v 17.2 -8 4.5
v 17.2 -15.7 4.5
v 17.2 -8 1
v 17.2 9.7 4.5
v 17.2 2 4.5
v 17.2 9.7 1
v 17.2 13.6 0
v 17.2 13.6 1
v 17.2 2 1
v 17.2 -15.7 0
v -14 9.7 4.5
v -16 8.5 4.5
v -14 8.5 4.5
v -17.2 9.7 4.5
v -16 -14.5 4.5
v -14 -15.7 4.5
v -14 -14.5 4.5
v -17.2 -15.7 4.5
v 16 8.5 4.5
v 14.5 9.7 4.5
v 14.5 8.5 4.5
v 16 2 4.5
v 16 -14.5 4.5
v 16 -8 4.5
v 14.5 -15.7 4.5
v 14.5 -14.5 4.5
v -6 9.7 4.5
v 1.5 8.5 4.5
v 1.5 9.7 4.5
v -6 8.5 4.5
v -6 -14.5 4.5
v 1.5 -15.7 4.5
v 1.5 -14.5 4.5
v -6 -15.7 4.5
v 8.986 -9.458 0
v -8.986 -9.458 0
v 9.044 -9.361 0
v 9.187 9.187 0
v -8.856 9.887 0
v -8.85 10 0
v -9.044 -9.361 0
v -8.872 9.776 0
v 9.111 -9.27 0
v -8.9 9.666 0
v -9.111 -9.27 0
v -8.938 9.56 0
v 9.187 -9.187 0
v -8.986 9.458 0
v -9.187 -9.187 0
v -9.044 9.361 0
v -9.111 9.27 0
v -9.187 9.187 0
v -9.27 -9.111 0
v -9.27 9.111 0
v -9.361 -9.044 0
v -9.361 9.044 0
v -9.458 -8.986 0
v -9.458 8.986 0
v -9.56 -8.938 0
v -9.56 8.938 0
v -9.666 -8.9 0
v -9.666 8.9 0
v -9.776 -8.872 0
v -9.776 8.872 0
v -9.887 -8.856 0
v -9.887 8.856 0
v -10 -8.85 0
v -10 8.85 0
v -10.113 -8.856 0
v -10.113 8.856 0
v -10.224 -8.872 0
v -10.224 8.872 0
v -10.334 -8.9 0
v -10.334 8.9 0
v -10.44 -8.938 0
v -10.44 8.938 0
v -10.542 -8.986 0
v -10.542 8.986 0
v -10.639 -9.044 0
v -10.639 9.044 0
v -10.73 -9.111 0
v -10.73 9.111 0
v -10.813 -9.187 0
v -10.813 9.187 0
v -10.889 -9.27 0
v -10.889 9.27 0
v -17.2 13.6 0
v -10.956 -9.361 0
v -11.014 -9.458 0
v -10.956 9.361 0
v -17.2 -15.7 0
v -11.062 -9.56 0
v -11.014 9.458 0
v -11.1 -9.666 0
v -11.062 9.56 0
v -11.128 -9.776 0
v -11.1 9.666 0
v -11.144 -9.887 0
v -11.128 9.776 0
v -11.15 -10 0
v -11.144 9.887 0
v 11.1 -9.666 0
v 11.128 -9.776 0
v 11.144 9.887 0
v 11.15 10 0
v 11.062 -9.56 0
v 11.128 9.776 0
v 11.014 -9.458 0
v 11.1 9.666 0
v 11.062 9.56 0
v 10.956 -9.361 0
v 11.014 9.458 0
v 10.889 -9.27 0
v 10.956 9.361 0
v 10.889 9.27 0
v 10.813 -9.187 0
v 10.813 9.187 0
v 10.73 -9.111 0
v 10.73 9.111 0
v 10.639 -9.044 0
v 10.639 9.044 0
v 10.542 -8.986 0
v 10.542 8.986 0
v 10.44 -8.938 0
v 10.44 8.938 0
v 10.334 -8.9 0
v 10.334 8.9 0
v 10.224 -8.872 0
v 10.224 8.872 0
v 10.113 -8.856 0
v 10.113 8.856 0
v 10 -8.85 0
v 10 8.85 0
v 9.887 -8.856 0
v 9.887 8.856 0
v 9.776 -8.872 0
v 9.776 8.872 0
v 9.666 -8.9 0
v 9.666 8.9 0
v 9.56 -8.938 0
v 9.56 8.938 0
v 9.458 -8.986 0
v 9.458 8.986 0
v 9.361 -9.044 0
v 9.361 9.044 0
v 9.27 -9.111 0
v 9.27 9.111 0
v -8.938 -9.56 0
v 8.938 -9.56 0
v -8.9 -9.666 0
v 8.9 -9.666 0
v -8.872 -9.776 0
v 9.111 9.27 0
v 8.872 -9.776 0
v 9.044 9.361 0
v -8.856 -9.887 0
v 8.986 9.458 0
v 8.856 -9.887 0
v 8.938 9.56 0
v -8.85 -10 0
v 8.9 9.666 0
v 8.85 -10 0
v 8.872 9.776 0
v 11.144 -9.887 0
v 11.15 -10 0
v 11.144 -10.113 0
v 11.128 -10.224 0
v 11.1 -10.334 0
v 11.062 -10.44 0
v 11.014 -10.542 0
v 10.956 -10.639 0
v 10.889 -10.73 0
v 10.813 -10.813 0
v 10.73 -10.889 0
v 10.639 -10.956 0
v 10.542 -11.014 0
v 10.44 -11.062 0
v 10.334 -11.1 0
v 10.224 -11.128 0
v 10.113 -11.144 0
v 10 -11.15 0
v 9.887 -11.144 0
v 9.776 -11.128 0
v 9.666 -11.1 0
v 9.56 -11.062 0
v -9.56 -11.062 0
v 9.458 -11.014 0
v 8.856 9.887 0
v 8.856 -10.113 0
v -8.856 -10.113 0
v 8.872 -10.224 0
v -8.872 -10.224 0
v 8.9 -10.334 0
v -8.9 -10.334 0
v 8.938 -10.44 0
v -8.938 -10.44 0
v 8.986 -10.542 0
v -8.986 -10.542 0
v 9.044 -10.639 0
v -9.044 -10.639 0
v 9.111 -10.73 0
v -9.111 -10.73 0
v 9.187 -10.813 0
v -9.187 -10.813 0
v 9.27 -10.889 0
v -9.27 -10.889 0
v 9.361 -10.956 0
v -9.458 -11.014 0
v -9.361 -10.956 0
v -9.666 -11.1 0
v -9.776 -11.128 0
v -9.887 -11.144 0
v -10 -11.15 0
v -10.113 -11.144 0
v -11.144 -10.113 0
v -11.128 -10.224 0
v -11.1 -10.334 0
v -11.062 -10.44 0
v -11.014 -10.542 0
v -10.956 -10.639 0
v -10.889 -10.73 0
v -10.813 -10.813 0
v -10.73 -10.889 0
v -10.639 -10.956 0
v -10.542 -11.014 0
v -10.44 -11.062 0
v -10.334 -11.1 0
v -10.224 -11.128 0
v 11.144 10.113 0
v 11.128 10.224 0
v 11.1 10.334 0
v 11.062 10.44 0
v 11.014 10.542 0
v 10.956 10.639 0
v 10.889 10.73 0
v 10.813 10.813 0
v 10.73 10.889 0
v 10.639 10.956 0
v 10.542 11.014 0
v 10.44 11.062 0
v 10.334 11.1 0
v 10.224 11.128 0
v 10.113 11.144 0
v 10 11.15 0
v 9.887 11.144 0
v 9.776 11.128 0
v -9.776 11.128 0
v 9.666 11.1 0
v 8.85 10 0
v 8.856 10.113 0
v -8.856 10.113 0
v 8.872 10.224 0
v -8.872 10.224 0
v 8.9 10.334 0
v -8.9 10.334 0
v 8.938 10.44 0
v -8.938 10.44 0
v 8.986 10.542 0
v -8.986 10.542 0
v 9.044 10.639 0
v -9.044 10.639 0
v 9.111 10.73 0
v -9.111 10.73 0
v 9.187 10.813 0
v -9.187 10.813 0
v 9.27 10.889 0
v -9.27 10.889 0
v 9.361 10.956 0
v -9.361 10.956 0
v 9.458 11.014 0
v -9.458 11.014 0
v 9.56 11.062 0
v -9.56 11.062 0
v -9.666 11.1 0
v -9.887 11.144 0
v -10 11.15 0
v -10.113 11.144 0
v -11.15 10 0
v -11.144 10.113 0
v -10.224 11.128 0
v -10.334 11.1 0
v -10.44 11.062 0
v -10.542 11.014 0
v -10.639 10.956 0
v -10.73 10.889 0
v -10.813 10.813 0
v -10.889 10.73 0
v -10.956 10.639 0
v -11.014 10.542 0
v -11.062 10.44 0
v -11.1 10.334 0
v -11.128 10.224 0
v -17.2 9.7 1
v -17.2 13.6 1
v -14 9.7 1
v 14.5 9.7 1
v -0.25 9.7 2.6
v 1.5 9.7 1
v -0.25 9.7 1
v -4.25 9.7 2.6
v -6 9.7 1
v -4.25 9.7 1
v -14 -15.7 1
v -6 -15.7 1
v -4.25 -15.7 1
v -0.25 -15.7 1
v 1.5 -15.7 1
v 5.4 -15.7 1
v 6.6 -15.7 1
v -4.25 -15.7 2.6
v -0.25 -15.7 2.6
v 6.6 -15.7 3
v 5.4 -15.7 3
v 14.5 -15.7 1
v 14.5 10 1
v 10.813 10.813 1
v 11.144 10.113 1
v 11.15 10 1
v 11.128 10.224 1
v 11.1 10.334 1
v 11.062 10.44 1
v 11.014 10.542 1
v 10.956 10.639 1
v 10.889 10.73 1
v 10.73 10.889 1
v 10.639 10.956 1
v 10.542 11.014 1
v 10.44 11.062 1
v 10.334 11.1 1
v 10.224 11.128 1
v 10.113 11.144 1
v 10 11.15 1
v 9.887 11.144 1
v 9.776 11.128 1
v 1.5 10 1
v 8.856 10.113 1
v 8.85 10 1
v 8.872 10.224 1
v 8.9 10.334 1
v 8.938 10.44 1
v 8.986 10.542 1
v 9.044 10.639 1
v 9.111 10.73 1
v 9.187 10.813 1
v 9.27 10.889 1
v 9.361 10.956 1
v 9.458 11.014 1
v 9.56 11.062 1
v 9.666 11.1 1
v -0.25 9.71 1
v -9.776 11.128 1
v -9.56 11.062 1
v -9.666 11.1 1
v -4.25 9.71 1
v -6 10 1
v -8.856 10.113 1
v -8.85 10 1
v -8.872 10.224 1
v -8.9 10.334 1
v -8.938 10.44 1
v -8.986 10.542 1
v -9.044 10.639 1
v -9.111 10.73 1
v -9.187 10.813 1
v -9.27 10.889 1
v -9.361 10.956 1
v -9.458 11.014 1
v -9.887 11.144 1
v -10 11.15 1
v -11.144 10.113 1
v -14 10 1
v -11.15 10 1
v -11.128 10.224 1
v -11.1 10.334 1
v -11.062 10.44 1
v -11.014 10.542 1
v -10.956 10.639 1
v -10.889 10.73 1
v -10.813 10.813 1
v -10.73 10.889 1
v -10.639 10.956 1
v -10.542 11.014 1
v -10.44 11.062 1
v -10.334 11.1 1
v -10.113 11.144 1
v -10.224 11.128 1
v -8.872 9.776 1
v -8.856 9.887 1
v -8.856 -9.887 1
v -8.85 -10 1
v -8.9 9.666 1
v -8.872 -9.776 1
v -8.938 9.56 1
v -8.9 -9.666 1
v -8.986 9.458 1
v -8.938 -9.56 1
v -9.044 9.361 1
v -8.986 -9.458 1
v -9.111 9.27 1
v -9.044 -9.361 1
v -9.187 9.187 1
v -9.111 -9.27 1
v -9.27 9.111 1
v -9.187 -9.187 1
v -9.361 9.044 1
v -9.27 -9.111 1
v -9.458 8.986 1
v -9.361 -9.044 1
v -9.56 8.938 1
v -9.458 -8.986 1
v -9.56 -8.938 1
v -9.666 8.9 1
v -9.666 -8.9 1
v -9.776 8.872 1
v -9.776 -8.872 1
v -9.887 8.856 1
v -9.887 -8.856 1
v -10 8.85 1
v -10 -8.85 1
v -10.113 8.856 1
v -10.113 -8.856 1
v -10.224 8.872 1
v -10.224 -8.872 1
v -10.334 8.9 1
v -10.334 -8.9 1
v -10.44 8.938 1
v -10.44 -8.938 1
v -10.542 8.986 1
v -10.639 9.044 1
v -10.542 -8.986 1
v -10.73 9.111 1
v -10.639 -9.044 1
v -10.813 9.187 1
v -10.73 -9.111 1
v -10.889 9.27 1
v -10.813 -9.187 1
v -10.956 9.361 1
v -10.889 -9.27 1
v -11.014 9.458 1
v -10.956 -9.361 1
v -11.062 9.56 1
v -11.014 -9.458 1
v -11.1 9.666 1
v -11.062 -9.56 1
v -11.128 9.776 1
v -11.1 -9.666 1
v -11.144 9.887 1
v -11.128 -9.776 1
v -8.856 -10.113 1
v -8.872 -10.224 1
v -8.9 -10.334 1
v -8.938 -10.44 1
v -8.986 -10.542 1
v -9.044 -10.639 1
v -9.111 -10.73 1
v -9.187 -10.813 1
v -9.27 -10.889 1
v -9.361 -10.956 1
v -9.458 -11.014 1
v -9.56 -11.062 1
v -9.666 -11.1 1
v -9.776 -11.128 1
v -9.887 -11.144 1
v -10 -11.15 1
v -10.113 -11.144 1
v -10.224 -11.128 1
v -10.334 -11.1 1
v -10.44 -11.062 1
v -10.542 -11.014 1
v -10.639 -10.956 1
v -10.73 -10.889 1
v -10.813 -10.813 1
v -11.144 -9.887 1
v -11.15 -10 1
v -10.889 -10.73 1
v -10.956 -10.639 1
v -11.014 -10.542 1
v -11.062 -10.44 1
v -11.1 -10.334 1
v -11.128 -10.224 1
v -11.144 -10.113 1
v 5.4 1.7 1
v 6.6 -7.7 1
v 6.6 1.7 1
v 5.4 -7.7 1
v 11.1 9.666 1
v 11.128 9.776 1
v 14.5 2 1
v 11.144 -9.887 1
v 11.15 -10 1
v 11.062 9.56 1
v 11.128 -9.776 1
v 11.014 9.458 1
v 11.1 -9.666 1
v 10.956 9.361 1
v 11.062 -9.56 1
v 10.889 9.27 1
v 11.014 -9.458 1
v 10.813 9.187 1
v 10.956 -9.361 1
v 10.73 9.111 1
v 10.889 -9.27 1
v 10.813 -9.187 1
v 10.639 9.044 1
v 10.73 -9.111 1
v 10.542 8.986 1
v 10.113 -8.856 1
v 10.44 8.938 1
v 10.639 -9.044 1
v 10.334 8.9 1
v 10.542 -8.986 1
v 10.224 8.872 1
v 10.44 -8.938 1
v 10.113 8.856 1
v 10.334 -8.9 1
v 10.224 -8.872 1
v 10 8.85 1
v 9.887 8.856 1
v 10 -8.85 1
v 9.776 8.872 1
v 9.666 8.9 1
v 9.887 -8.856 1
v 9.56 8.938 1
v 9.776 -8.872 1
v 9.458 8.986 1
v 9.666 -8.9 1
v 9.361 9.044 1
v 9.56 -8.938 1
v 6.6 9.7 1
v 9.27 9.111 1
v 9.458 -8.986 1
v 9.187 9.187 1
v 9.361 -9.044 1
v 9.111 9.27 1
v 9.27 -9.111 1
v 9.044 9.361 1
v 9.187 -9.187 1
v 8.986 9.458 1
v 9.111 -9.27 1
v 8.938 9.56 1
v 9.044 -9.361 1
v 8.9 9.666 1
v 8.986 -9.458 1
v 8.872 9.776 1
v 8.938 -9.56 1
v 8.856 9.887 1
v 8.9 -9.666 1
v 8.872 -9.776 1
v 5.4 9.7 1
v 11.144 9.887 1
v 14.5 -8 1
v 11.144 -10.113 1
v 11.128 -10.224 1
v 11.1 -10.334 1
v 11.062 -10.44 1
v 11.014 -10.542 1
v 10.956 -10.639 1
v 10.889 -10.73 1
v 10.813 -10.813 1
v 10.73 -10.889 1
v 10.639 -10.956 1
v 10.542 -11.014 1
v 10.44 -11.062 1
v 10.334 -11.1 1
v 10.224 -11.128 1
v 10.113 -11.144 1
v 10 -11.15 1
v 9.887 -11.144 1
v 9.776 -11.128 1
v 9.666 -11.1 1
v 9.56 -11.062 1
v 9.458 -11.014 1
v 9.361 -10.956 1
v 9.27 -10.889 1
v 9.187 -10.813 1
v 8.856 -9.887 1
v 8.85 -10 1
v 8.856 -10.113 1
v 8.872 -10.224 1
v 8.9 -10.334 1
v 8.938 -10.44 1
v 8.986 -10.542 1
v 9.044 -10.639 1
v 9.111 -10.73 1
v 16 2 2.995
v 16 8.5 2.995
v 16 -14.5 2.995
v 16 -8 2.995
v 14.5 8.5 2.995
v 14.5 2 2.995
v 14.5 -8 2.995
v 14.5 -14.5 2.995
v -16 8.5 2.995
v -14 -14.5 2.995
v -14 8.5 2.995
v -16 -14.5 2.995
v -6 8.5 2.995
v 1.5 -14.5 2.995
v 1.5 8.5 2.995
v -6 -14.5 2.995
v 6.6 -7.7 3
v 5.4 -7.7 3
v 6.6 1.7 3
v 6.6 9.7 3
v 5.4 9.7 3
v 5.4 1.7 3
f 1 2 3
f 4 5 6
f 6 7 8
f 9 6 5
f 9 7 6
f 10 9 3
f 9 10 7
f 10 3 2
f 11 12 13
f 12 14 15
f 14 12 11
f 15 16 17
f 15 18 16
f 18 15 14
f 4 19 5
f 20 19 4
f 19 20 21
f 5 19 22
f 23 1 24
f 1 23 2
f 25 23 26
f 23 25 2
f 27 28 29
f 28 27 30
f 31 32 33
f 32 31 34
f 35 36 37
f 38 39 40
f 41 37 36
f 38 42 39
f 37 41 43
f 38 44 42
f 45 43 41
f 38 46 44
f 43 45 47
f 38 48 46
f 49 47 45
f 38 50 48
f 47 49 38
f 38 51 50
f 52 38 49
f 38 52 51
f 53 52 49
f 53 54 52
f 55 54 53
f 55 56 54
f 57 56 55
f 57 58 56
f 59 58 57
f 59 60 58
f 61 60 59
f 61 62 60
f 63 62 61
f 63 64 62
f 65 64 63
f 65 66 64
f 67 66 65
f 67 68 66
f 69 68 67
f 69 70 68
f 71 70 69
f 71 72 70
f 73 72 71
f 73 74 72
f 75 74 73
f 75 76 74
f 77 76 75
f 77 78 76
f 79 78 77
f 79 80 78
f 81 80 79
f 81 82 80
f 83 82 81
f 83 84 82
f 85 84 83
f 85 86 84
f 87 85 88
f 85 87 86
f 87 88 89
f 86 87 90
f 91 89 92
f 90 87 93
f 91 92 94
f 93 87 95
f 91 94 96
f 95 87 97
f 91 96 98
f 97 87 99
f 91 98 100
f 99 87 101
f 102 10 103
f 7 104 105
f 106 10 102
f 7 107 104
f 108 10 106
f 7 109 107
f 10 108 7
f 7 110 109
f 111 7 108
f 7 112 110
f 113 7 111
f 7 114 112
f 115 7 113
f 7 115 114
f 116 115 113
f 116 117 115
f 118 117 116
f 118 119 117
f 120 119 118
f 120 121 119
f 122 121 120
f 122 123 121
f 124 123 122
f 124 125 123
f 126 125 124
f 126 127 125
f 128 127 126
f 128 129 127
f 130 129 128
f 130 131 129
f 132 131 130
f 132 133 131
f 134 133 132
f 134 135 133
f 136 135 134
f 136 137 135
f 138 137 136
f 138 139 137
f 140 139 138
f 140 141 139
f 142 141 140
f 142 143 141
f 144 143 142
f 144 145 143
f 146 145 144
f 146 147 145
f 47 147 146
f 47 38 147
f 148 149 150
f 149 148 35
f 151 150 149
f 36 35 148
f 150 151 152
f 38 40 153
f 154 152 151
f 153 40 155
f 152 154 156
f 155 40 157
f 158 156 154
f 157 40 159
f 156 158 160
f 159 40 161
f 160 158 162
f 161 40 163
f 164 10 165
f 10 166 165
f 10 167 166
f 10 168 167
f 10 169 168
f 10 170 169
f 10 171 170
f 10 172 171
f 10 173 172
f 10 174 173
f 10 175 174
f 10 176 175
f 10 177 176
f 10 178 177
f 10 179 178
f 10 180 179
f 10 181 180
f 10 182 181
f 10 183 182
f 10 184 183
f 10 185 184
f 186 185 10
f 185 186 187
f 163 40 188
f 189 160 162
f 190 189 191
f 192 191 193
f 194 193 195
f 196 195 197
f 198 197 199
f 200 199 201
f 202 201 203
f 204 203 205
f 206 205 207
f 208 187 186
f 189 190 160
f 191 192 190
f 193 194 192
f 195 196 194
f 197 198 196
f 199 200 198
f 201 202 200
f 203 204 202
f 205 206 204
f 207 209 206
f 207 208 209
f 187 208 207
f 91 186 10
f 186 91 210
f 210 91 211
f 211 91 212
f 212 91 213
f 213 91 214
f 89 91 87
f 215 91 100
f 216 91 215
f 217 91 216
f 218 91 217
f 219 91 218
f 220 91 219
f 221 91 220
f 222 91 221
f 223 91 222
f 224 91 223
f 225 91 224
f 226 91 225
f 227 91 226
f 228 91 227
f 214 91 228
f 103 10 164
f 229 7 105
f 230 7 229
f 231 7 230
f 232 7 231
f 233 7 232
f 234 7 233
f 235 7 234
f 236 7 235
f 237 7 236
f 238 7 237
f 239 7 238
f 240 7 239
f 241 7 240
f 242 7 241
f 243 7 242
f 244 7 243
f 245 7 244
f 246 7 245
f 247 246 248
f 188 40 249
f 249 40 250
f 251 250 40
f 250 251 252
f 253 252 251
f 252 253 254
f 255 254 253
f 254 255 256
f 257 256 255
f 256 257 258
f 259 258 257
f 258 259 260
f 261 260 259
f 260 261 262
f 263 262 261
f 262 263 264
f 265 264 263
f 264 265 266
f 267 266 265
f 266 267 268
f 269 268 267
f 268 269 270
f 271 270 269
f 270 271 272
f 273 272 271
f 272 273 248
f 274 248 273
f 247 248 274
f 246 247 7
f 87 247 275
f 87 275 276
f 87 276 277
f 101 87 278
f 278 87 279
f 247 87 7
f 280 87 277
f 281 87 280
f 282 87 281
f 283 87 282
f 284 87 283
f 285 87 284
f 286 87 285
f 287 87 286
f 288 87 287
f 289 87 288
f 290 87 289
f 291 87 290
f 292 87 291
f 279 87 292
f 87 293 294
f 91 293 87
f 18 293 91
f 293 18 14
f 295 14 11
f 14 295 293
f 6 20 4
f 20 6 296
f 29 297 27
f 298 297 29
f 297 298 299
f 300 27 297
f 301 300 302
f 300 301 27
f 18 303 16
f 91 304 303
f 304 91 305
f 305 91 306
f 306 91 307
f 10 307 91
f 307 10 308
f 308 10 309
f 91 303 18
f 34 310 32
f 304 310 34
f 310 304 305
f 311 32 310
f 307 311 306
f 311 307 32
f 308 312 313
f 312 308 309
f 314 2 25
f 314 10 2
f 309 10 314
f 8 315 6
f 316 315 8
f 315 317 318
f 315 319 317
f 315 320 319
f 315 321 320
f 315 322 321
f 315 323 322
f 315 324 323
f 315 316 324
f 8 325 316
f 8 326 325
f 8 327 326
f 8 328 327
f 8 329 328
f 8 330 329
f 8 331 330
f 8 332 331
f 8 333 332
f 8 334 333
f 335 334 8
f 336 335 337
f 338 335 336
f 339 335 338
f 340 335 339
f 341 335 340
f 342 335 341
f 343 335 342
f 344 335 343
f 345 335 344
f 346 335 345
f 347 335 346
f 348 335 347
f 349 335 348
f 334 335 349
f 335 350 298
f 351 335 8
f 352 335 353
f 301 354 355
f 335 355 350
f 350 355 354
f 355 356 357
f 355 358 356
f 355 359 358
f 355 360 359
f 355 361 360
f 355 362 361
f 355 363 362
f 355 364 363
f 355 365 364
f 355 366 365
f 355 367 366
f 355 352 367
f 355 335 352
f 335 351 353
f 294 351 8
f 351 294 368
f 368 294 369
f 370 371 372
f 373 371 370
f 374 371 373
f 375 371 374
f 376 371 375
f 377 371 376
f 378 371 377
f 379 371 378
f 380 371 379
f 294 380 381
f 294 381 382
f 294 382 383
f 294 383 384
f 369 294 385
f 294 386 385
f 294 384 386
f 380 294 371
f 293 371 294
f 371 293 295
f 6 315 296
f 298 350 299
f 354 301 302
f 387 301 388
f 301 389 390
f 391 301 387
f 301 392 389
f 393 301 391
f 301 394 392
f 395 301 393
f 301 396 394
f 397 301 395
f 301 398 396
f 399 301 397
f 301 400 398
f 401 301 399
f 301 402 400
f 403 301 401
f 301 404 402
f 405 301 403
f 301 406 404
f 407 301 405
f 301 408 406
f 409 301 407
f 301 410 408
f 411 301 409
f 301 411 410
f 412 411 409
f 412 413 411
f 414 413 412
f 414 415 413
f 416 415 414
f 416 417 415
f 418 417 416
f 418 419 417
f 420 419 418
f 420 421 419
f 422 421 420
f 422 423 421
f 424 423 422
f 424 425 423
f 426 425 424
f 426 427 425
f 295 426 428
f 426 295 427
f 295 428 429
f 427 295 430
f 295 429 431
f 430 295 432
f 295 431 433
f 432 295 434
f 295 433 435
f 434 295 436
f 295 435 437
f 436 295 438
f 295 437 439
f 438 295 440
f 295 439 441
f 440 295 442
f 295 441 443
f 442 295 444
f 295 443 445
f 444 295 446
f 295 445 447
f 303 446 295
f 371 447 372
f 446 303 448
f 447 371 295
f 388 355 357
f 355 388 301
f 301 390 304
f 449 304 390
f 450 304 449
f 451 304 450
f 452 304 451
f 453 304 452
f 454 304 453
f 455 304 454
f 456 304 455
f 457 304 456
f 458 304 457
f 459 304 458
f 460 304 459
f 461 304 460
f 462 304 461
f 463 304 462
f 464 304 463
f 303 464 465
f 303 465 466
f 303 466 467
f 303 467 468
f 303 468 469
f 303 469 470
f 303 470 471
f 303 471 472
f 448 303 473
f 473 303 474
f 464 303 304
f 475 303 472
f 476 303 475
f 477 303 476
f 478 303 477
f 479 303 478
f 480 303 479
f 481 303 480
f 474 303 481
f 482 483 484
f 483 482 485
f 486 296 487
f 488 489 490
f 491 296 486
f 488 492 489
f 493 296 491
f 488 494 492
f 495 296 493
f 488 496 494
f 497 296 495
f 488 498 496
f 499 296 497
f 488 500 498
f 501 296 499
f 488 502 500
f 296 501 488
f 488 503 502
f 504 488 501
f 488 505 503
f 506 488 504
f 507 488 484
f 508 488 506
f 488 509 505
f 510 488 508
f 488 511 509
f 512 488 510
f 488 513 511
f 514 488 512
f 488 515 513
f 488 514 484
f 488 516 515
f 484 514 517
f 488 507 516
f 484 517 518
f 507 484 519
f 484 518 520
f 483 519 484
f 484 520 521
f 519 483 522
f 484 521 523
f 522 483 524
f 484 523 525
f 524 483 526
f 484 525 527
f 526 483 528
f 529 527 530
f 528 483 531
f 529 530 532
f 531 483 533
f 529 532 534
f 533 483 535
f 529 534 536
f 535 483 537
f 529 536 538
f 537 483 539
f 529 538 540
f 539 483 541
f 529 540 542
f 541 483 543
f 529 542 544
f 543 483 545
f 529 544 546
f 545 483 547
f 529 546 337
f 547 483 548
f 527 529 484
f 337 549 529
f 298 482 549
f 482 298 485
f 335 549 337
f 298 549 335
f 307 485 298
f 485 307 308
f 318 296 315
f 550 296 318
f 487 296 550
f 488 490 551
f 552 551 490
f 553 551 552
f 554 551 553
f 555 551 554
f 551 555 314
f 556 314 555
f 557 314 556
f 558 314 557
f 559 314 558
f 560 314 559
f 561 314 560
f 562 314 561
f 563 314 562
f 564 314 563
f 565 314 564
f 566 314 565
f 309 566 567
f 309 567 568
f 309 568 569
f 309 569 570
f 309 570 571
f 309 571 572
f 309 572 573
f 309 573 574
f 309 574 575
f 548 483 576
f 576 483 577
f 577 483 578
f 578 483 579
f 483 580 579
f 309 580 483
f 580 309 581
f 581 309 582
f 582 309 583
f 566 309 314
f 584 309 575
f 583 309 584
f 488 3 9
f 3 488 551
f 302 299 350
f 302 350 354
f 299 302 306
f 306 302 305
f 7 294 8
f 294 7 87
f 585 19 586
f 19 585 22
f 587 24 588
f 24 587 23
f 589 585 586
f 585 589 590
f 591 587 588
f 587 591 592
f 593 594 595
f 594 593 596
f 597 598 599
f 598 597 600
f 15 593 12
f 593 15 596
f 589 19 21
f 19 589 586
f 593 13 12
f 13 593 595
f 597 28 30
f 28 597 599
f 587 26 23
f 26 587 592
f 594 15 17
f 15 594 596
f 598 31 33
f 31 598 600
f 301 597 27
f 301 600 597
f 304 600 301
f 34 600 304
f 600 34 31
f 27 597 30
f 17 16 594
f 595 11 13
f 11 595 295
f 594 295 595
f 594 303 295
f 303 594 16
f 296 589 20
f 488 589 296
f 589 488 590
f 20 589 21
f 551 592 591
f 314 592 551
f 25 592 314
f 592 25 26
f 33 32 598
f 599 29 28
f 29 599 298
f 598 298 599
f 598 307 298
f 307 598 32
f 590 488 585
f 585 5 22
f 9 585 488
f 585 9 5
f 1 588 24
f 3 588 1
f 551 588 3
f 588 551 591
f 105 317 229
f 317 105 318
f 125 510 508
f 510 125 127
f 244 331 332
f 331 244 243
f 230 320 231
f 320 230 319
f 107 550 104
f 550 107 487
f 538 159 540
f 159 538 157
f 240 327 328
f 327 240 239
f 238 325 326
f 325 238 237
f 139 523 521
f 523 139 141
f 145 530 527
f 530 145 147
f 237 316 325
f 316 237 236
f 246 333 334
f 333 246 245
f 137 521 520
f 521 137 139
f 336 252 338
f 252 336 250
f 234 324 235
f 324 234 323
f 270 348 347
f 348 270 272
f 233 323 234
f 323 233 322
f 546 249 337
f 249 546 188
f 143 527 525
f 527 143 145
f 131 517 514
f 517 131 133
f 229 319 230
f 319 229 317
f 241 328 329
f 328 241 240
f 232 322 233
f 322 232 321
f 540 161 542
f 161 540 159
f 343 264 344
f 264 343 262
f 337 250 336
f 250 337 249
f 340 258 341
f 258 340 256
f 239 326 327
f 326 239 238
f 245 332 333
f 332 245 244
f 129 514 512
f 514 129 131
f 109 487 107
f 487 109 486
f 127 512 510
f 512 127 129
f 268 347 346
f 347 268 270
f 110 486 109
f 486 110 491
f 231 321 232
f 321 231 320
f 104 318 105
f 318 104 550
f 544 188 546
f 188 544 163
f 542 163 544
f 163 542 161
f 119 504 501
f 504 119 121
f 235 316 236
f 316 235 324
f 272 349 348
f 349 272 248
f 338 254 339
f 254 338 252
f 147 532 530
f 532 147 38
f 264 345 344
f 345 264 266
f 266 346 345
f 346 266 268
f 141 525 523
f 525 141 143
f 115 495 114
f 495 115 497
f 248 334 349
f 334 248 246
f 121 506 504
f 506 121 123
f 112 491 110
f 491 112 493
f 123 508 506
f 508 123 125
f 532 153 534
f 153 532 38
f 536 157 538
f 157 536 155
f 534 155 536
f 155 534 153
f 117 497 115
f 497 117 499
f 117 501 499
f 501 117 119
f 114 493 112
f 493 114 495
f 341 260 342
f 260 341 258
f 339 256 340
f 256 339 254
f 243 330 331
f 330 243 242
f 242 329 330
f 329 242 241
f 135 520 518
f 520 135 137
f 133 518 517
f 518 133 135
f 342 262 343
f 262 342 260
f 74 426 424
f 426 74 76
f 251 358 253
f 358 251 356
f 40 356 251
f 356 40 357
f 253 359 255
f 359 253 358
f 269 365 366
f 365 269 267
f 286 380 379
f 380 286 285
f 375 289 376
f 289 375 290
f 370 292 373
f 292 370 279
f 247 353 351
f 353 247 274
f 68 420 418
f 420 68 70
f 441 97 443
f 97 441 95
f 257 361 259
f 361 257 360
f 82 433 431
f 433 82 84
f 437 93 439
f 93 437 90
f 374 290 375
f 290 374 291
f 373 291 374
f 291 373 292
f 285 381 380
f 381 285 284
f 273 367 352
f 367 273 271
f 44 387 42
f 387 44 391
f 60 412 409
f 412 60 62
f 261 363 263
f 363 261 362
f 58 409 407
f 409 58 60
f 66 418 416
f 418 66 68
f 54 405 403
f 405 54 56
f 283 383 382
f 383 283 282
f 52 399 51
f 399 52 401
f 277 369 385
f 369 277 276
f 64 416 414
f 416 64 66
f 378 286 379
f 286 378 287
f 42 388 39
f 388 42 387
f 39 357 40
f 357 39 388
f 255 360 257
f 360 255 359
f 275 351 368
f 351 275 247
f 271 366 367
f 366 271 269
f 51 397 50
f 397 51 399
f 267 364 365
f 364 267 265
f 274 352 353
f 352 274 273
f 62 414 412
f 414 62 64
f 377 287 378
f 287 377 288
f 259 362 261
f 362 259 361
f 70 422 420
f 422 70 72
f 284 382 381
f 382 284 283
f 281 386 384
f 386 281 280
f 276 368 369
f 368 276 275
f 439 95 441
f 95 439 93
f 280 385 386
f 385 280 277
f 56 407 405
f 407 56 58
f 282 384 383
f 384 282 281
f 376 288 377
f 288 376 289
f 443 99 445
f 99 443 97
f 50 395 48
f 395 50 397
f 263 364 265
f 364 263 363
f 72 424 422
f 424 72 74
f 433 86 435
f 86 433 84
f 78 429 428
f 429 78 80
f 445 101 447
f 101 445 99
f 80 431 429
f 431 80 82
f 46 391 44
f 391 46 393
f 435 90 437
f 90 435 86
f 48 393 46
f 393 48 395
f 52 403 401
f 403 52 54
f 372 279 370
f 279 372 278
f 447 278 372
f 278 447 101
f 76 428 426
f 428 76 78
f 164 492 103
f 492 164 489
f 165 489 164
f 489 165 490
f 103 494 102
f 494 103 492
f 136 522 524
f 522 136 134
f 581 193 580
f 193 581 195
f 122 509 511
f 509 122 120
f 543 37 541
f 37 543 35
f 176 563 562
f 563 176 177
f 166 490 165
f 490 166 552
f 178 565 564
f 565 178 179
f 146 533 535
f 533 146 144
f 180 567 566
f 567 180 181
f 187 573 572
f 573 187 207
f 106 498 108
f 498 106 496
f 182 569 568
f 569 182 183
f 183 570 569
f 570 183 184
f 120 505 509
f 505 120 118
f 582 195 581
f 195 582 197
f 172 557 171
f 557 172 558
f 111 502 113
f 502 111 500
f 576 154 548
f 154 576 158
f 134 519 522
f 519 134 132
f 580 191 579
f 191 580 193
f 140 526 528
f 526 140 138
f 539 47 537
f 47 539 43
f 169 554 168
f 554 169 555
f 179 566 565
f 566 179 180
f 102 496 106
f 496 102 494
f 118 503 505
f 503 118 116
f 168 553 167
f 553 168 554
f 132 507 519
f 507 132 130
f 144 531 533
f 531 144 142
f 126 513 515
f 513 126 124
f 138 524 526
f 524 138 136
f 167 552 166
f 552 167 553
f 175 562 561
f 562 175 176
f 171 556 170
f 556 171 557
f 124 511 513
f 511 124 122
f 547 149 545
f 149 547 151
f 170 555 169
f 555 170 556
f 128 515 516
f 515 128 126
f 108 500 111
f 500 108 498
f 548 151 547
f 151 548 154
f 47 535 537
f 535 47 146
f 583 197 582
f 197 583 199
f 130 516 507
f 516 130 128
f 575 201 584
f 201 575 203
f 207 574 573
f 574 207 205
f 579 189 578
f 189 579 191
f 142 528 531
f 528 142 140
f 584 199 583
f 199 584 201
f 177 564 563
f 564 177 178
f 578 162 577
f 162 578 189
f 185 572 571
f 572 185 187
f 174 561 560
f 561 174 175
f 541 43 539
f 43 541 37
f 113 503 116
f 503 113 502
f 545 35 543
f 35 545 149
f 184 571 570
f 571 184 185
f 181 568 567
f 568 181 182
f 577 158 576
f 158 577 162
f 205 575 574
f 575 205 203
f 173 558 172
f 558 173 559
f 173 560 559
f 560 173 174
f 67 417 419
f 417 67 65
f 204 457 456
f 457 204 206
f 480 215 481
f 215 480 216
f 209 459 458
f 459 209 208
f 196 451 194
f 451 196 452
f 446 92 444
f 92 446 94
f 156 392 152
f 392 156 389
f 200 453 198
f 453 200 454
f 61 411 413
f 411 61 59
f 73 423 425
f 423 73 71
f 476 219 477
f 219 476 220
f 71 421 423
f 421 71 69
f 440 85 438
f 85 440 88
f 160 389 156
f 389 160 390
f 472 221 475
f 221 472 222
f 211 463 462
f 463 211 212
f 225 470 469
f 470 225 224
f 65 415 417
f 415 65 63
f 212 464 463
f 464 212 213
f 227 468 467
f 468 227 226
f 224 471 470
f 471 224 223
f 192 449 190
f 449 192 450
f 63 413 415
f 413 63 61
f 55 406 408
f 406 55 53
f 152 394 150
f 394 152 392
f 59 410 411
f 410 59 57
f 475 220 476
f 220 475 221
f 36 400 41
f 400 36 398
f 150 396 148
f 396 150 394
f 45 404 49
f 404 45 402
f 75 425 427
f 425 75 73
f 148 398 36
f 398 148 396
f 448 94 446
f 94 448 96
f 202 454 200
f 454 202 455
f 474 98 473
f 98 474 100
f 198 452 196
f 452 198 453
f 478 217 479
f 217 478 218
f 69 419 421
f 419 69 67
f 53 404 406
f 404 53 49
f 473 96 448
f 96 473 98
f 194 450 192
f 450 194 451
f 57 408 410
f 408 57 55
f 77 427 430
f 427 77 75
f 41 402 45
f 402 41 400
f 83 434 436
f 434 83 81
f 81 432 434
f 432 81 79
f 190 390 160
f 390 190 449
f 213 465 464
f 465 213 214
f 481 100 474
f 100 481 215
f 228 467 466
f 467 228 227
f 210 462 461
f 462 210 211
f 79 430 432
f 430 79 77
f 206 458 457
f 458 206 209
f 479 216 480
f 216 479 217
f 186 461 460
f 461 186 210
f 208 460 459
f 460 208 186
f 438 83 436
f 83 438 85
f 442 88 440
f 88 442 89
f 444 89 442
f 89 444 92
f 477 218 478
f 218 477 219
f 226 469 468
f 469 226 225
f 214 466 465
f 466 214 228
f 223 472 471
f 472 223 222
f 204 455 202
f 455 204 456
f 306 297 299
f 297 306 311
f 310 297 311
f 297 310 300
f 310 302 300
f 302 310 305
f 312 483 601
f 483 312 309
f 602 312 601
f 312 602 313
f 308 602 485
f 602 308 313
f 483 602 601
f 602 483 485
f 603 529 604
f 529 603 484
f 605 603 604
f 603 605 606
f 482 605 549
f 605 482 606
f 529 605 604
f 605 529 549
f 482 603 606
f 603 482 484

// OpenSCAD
$fn = 64;

union() {
    difference() {
        union() {
            translate([0, -3, 2.25]) cube([32 + 2.4, 23 + 2.4, 4.5], center = true);
            translate([0, 11.6, 0.5]) cube([32 + 2.4, 4, 1], center = true);
        }
        translate([0, -3, 2.25 + 1.5]) cube([32, 23, 1.51], center = true);
        translate([-10, -3, 2.25 + 1]) cube([8, 26, 4.5], center = true);
        translate([8, -3, 2.25 + 1]) cube([13, 26, 4.5], center = true);
        translate([16, -3, 2.25 + 1]) cube([6, 10, 4.5], center = true);
        translate([10, 10, -0.01]) cylinder(d = 2.3, h = 5);
        translate([-10, 10, -0.01]) cylinder(d = 2.3, h = 5);
        translate([10, -10, -0.01]) cylinder(d = 2.3, h = 5);
        translate([-10, -10, -0.01]) cylinder(d = 2.3, h = 5);
        translate([-2.25, -3, 1 + 1.6/2]) cube([4, 23 + 2.4 + 0.02, 1.6], center = true);
    }
    translate([6, -11.7, 1.5]) cube([1.2, 8, 3], center = true);
    translate([6, 5.7, 1.5]) cube([1.2, 8, 3], center = true);
}
